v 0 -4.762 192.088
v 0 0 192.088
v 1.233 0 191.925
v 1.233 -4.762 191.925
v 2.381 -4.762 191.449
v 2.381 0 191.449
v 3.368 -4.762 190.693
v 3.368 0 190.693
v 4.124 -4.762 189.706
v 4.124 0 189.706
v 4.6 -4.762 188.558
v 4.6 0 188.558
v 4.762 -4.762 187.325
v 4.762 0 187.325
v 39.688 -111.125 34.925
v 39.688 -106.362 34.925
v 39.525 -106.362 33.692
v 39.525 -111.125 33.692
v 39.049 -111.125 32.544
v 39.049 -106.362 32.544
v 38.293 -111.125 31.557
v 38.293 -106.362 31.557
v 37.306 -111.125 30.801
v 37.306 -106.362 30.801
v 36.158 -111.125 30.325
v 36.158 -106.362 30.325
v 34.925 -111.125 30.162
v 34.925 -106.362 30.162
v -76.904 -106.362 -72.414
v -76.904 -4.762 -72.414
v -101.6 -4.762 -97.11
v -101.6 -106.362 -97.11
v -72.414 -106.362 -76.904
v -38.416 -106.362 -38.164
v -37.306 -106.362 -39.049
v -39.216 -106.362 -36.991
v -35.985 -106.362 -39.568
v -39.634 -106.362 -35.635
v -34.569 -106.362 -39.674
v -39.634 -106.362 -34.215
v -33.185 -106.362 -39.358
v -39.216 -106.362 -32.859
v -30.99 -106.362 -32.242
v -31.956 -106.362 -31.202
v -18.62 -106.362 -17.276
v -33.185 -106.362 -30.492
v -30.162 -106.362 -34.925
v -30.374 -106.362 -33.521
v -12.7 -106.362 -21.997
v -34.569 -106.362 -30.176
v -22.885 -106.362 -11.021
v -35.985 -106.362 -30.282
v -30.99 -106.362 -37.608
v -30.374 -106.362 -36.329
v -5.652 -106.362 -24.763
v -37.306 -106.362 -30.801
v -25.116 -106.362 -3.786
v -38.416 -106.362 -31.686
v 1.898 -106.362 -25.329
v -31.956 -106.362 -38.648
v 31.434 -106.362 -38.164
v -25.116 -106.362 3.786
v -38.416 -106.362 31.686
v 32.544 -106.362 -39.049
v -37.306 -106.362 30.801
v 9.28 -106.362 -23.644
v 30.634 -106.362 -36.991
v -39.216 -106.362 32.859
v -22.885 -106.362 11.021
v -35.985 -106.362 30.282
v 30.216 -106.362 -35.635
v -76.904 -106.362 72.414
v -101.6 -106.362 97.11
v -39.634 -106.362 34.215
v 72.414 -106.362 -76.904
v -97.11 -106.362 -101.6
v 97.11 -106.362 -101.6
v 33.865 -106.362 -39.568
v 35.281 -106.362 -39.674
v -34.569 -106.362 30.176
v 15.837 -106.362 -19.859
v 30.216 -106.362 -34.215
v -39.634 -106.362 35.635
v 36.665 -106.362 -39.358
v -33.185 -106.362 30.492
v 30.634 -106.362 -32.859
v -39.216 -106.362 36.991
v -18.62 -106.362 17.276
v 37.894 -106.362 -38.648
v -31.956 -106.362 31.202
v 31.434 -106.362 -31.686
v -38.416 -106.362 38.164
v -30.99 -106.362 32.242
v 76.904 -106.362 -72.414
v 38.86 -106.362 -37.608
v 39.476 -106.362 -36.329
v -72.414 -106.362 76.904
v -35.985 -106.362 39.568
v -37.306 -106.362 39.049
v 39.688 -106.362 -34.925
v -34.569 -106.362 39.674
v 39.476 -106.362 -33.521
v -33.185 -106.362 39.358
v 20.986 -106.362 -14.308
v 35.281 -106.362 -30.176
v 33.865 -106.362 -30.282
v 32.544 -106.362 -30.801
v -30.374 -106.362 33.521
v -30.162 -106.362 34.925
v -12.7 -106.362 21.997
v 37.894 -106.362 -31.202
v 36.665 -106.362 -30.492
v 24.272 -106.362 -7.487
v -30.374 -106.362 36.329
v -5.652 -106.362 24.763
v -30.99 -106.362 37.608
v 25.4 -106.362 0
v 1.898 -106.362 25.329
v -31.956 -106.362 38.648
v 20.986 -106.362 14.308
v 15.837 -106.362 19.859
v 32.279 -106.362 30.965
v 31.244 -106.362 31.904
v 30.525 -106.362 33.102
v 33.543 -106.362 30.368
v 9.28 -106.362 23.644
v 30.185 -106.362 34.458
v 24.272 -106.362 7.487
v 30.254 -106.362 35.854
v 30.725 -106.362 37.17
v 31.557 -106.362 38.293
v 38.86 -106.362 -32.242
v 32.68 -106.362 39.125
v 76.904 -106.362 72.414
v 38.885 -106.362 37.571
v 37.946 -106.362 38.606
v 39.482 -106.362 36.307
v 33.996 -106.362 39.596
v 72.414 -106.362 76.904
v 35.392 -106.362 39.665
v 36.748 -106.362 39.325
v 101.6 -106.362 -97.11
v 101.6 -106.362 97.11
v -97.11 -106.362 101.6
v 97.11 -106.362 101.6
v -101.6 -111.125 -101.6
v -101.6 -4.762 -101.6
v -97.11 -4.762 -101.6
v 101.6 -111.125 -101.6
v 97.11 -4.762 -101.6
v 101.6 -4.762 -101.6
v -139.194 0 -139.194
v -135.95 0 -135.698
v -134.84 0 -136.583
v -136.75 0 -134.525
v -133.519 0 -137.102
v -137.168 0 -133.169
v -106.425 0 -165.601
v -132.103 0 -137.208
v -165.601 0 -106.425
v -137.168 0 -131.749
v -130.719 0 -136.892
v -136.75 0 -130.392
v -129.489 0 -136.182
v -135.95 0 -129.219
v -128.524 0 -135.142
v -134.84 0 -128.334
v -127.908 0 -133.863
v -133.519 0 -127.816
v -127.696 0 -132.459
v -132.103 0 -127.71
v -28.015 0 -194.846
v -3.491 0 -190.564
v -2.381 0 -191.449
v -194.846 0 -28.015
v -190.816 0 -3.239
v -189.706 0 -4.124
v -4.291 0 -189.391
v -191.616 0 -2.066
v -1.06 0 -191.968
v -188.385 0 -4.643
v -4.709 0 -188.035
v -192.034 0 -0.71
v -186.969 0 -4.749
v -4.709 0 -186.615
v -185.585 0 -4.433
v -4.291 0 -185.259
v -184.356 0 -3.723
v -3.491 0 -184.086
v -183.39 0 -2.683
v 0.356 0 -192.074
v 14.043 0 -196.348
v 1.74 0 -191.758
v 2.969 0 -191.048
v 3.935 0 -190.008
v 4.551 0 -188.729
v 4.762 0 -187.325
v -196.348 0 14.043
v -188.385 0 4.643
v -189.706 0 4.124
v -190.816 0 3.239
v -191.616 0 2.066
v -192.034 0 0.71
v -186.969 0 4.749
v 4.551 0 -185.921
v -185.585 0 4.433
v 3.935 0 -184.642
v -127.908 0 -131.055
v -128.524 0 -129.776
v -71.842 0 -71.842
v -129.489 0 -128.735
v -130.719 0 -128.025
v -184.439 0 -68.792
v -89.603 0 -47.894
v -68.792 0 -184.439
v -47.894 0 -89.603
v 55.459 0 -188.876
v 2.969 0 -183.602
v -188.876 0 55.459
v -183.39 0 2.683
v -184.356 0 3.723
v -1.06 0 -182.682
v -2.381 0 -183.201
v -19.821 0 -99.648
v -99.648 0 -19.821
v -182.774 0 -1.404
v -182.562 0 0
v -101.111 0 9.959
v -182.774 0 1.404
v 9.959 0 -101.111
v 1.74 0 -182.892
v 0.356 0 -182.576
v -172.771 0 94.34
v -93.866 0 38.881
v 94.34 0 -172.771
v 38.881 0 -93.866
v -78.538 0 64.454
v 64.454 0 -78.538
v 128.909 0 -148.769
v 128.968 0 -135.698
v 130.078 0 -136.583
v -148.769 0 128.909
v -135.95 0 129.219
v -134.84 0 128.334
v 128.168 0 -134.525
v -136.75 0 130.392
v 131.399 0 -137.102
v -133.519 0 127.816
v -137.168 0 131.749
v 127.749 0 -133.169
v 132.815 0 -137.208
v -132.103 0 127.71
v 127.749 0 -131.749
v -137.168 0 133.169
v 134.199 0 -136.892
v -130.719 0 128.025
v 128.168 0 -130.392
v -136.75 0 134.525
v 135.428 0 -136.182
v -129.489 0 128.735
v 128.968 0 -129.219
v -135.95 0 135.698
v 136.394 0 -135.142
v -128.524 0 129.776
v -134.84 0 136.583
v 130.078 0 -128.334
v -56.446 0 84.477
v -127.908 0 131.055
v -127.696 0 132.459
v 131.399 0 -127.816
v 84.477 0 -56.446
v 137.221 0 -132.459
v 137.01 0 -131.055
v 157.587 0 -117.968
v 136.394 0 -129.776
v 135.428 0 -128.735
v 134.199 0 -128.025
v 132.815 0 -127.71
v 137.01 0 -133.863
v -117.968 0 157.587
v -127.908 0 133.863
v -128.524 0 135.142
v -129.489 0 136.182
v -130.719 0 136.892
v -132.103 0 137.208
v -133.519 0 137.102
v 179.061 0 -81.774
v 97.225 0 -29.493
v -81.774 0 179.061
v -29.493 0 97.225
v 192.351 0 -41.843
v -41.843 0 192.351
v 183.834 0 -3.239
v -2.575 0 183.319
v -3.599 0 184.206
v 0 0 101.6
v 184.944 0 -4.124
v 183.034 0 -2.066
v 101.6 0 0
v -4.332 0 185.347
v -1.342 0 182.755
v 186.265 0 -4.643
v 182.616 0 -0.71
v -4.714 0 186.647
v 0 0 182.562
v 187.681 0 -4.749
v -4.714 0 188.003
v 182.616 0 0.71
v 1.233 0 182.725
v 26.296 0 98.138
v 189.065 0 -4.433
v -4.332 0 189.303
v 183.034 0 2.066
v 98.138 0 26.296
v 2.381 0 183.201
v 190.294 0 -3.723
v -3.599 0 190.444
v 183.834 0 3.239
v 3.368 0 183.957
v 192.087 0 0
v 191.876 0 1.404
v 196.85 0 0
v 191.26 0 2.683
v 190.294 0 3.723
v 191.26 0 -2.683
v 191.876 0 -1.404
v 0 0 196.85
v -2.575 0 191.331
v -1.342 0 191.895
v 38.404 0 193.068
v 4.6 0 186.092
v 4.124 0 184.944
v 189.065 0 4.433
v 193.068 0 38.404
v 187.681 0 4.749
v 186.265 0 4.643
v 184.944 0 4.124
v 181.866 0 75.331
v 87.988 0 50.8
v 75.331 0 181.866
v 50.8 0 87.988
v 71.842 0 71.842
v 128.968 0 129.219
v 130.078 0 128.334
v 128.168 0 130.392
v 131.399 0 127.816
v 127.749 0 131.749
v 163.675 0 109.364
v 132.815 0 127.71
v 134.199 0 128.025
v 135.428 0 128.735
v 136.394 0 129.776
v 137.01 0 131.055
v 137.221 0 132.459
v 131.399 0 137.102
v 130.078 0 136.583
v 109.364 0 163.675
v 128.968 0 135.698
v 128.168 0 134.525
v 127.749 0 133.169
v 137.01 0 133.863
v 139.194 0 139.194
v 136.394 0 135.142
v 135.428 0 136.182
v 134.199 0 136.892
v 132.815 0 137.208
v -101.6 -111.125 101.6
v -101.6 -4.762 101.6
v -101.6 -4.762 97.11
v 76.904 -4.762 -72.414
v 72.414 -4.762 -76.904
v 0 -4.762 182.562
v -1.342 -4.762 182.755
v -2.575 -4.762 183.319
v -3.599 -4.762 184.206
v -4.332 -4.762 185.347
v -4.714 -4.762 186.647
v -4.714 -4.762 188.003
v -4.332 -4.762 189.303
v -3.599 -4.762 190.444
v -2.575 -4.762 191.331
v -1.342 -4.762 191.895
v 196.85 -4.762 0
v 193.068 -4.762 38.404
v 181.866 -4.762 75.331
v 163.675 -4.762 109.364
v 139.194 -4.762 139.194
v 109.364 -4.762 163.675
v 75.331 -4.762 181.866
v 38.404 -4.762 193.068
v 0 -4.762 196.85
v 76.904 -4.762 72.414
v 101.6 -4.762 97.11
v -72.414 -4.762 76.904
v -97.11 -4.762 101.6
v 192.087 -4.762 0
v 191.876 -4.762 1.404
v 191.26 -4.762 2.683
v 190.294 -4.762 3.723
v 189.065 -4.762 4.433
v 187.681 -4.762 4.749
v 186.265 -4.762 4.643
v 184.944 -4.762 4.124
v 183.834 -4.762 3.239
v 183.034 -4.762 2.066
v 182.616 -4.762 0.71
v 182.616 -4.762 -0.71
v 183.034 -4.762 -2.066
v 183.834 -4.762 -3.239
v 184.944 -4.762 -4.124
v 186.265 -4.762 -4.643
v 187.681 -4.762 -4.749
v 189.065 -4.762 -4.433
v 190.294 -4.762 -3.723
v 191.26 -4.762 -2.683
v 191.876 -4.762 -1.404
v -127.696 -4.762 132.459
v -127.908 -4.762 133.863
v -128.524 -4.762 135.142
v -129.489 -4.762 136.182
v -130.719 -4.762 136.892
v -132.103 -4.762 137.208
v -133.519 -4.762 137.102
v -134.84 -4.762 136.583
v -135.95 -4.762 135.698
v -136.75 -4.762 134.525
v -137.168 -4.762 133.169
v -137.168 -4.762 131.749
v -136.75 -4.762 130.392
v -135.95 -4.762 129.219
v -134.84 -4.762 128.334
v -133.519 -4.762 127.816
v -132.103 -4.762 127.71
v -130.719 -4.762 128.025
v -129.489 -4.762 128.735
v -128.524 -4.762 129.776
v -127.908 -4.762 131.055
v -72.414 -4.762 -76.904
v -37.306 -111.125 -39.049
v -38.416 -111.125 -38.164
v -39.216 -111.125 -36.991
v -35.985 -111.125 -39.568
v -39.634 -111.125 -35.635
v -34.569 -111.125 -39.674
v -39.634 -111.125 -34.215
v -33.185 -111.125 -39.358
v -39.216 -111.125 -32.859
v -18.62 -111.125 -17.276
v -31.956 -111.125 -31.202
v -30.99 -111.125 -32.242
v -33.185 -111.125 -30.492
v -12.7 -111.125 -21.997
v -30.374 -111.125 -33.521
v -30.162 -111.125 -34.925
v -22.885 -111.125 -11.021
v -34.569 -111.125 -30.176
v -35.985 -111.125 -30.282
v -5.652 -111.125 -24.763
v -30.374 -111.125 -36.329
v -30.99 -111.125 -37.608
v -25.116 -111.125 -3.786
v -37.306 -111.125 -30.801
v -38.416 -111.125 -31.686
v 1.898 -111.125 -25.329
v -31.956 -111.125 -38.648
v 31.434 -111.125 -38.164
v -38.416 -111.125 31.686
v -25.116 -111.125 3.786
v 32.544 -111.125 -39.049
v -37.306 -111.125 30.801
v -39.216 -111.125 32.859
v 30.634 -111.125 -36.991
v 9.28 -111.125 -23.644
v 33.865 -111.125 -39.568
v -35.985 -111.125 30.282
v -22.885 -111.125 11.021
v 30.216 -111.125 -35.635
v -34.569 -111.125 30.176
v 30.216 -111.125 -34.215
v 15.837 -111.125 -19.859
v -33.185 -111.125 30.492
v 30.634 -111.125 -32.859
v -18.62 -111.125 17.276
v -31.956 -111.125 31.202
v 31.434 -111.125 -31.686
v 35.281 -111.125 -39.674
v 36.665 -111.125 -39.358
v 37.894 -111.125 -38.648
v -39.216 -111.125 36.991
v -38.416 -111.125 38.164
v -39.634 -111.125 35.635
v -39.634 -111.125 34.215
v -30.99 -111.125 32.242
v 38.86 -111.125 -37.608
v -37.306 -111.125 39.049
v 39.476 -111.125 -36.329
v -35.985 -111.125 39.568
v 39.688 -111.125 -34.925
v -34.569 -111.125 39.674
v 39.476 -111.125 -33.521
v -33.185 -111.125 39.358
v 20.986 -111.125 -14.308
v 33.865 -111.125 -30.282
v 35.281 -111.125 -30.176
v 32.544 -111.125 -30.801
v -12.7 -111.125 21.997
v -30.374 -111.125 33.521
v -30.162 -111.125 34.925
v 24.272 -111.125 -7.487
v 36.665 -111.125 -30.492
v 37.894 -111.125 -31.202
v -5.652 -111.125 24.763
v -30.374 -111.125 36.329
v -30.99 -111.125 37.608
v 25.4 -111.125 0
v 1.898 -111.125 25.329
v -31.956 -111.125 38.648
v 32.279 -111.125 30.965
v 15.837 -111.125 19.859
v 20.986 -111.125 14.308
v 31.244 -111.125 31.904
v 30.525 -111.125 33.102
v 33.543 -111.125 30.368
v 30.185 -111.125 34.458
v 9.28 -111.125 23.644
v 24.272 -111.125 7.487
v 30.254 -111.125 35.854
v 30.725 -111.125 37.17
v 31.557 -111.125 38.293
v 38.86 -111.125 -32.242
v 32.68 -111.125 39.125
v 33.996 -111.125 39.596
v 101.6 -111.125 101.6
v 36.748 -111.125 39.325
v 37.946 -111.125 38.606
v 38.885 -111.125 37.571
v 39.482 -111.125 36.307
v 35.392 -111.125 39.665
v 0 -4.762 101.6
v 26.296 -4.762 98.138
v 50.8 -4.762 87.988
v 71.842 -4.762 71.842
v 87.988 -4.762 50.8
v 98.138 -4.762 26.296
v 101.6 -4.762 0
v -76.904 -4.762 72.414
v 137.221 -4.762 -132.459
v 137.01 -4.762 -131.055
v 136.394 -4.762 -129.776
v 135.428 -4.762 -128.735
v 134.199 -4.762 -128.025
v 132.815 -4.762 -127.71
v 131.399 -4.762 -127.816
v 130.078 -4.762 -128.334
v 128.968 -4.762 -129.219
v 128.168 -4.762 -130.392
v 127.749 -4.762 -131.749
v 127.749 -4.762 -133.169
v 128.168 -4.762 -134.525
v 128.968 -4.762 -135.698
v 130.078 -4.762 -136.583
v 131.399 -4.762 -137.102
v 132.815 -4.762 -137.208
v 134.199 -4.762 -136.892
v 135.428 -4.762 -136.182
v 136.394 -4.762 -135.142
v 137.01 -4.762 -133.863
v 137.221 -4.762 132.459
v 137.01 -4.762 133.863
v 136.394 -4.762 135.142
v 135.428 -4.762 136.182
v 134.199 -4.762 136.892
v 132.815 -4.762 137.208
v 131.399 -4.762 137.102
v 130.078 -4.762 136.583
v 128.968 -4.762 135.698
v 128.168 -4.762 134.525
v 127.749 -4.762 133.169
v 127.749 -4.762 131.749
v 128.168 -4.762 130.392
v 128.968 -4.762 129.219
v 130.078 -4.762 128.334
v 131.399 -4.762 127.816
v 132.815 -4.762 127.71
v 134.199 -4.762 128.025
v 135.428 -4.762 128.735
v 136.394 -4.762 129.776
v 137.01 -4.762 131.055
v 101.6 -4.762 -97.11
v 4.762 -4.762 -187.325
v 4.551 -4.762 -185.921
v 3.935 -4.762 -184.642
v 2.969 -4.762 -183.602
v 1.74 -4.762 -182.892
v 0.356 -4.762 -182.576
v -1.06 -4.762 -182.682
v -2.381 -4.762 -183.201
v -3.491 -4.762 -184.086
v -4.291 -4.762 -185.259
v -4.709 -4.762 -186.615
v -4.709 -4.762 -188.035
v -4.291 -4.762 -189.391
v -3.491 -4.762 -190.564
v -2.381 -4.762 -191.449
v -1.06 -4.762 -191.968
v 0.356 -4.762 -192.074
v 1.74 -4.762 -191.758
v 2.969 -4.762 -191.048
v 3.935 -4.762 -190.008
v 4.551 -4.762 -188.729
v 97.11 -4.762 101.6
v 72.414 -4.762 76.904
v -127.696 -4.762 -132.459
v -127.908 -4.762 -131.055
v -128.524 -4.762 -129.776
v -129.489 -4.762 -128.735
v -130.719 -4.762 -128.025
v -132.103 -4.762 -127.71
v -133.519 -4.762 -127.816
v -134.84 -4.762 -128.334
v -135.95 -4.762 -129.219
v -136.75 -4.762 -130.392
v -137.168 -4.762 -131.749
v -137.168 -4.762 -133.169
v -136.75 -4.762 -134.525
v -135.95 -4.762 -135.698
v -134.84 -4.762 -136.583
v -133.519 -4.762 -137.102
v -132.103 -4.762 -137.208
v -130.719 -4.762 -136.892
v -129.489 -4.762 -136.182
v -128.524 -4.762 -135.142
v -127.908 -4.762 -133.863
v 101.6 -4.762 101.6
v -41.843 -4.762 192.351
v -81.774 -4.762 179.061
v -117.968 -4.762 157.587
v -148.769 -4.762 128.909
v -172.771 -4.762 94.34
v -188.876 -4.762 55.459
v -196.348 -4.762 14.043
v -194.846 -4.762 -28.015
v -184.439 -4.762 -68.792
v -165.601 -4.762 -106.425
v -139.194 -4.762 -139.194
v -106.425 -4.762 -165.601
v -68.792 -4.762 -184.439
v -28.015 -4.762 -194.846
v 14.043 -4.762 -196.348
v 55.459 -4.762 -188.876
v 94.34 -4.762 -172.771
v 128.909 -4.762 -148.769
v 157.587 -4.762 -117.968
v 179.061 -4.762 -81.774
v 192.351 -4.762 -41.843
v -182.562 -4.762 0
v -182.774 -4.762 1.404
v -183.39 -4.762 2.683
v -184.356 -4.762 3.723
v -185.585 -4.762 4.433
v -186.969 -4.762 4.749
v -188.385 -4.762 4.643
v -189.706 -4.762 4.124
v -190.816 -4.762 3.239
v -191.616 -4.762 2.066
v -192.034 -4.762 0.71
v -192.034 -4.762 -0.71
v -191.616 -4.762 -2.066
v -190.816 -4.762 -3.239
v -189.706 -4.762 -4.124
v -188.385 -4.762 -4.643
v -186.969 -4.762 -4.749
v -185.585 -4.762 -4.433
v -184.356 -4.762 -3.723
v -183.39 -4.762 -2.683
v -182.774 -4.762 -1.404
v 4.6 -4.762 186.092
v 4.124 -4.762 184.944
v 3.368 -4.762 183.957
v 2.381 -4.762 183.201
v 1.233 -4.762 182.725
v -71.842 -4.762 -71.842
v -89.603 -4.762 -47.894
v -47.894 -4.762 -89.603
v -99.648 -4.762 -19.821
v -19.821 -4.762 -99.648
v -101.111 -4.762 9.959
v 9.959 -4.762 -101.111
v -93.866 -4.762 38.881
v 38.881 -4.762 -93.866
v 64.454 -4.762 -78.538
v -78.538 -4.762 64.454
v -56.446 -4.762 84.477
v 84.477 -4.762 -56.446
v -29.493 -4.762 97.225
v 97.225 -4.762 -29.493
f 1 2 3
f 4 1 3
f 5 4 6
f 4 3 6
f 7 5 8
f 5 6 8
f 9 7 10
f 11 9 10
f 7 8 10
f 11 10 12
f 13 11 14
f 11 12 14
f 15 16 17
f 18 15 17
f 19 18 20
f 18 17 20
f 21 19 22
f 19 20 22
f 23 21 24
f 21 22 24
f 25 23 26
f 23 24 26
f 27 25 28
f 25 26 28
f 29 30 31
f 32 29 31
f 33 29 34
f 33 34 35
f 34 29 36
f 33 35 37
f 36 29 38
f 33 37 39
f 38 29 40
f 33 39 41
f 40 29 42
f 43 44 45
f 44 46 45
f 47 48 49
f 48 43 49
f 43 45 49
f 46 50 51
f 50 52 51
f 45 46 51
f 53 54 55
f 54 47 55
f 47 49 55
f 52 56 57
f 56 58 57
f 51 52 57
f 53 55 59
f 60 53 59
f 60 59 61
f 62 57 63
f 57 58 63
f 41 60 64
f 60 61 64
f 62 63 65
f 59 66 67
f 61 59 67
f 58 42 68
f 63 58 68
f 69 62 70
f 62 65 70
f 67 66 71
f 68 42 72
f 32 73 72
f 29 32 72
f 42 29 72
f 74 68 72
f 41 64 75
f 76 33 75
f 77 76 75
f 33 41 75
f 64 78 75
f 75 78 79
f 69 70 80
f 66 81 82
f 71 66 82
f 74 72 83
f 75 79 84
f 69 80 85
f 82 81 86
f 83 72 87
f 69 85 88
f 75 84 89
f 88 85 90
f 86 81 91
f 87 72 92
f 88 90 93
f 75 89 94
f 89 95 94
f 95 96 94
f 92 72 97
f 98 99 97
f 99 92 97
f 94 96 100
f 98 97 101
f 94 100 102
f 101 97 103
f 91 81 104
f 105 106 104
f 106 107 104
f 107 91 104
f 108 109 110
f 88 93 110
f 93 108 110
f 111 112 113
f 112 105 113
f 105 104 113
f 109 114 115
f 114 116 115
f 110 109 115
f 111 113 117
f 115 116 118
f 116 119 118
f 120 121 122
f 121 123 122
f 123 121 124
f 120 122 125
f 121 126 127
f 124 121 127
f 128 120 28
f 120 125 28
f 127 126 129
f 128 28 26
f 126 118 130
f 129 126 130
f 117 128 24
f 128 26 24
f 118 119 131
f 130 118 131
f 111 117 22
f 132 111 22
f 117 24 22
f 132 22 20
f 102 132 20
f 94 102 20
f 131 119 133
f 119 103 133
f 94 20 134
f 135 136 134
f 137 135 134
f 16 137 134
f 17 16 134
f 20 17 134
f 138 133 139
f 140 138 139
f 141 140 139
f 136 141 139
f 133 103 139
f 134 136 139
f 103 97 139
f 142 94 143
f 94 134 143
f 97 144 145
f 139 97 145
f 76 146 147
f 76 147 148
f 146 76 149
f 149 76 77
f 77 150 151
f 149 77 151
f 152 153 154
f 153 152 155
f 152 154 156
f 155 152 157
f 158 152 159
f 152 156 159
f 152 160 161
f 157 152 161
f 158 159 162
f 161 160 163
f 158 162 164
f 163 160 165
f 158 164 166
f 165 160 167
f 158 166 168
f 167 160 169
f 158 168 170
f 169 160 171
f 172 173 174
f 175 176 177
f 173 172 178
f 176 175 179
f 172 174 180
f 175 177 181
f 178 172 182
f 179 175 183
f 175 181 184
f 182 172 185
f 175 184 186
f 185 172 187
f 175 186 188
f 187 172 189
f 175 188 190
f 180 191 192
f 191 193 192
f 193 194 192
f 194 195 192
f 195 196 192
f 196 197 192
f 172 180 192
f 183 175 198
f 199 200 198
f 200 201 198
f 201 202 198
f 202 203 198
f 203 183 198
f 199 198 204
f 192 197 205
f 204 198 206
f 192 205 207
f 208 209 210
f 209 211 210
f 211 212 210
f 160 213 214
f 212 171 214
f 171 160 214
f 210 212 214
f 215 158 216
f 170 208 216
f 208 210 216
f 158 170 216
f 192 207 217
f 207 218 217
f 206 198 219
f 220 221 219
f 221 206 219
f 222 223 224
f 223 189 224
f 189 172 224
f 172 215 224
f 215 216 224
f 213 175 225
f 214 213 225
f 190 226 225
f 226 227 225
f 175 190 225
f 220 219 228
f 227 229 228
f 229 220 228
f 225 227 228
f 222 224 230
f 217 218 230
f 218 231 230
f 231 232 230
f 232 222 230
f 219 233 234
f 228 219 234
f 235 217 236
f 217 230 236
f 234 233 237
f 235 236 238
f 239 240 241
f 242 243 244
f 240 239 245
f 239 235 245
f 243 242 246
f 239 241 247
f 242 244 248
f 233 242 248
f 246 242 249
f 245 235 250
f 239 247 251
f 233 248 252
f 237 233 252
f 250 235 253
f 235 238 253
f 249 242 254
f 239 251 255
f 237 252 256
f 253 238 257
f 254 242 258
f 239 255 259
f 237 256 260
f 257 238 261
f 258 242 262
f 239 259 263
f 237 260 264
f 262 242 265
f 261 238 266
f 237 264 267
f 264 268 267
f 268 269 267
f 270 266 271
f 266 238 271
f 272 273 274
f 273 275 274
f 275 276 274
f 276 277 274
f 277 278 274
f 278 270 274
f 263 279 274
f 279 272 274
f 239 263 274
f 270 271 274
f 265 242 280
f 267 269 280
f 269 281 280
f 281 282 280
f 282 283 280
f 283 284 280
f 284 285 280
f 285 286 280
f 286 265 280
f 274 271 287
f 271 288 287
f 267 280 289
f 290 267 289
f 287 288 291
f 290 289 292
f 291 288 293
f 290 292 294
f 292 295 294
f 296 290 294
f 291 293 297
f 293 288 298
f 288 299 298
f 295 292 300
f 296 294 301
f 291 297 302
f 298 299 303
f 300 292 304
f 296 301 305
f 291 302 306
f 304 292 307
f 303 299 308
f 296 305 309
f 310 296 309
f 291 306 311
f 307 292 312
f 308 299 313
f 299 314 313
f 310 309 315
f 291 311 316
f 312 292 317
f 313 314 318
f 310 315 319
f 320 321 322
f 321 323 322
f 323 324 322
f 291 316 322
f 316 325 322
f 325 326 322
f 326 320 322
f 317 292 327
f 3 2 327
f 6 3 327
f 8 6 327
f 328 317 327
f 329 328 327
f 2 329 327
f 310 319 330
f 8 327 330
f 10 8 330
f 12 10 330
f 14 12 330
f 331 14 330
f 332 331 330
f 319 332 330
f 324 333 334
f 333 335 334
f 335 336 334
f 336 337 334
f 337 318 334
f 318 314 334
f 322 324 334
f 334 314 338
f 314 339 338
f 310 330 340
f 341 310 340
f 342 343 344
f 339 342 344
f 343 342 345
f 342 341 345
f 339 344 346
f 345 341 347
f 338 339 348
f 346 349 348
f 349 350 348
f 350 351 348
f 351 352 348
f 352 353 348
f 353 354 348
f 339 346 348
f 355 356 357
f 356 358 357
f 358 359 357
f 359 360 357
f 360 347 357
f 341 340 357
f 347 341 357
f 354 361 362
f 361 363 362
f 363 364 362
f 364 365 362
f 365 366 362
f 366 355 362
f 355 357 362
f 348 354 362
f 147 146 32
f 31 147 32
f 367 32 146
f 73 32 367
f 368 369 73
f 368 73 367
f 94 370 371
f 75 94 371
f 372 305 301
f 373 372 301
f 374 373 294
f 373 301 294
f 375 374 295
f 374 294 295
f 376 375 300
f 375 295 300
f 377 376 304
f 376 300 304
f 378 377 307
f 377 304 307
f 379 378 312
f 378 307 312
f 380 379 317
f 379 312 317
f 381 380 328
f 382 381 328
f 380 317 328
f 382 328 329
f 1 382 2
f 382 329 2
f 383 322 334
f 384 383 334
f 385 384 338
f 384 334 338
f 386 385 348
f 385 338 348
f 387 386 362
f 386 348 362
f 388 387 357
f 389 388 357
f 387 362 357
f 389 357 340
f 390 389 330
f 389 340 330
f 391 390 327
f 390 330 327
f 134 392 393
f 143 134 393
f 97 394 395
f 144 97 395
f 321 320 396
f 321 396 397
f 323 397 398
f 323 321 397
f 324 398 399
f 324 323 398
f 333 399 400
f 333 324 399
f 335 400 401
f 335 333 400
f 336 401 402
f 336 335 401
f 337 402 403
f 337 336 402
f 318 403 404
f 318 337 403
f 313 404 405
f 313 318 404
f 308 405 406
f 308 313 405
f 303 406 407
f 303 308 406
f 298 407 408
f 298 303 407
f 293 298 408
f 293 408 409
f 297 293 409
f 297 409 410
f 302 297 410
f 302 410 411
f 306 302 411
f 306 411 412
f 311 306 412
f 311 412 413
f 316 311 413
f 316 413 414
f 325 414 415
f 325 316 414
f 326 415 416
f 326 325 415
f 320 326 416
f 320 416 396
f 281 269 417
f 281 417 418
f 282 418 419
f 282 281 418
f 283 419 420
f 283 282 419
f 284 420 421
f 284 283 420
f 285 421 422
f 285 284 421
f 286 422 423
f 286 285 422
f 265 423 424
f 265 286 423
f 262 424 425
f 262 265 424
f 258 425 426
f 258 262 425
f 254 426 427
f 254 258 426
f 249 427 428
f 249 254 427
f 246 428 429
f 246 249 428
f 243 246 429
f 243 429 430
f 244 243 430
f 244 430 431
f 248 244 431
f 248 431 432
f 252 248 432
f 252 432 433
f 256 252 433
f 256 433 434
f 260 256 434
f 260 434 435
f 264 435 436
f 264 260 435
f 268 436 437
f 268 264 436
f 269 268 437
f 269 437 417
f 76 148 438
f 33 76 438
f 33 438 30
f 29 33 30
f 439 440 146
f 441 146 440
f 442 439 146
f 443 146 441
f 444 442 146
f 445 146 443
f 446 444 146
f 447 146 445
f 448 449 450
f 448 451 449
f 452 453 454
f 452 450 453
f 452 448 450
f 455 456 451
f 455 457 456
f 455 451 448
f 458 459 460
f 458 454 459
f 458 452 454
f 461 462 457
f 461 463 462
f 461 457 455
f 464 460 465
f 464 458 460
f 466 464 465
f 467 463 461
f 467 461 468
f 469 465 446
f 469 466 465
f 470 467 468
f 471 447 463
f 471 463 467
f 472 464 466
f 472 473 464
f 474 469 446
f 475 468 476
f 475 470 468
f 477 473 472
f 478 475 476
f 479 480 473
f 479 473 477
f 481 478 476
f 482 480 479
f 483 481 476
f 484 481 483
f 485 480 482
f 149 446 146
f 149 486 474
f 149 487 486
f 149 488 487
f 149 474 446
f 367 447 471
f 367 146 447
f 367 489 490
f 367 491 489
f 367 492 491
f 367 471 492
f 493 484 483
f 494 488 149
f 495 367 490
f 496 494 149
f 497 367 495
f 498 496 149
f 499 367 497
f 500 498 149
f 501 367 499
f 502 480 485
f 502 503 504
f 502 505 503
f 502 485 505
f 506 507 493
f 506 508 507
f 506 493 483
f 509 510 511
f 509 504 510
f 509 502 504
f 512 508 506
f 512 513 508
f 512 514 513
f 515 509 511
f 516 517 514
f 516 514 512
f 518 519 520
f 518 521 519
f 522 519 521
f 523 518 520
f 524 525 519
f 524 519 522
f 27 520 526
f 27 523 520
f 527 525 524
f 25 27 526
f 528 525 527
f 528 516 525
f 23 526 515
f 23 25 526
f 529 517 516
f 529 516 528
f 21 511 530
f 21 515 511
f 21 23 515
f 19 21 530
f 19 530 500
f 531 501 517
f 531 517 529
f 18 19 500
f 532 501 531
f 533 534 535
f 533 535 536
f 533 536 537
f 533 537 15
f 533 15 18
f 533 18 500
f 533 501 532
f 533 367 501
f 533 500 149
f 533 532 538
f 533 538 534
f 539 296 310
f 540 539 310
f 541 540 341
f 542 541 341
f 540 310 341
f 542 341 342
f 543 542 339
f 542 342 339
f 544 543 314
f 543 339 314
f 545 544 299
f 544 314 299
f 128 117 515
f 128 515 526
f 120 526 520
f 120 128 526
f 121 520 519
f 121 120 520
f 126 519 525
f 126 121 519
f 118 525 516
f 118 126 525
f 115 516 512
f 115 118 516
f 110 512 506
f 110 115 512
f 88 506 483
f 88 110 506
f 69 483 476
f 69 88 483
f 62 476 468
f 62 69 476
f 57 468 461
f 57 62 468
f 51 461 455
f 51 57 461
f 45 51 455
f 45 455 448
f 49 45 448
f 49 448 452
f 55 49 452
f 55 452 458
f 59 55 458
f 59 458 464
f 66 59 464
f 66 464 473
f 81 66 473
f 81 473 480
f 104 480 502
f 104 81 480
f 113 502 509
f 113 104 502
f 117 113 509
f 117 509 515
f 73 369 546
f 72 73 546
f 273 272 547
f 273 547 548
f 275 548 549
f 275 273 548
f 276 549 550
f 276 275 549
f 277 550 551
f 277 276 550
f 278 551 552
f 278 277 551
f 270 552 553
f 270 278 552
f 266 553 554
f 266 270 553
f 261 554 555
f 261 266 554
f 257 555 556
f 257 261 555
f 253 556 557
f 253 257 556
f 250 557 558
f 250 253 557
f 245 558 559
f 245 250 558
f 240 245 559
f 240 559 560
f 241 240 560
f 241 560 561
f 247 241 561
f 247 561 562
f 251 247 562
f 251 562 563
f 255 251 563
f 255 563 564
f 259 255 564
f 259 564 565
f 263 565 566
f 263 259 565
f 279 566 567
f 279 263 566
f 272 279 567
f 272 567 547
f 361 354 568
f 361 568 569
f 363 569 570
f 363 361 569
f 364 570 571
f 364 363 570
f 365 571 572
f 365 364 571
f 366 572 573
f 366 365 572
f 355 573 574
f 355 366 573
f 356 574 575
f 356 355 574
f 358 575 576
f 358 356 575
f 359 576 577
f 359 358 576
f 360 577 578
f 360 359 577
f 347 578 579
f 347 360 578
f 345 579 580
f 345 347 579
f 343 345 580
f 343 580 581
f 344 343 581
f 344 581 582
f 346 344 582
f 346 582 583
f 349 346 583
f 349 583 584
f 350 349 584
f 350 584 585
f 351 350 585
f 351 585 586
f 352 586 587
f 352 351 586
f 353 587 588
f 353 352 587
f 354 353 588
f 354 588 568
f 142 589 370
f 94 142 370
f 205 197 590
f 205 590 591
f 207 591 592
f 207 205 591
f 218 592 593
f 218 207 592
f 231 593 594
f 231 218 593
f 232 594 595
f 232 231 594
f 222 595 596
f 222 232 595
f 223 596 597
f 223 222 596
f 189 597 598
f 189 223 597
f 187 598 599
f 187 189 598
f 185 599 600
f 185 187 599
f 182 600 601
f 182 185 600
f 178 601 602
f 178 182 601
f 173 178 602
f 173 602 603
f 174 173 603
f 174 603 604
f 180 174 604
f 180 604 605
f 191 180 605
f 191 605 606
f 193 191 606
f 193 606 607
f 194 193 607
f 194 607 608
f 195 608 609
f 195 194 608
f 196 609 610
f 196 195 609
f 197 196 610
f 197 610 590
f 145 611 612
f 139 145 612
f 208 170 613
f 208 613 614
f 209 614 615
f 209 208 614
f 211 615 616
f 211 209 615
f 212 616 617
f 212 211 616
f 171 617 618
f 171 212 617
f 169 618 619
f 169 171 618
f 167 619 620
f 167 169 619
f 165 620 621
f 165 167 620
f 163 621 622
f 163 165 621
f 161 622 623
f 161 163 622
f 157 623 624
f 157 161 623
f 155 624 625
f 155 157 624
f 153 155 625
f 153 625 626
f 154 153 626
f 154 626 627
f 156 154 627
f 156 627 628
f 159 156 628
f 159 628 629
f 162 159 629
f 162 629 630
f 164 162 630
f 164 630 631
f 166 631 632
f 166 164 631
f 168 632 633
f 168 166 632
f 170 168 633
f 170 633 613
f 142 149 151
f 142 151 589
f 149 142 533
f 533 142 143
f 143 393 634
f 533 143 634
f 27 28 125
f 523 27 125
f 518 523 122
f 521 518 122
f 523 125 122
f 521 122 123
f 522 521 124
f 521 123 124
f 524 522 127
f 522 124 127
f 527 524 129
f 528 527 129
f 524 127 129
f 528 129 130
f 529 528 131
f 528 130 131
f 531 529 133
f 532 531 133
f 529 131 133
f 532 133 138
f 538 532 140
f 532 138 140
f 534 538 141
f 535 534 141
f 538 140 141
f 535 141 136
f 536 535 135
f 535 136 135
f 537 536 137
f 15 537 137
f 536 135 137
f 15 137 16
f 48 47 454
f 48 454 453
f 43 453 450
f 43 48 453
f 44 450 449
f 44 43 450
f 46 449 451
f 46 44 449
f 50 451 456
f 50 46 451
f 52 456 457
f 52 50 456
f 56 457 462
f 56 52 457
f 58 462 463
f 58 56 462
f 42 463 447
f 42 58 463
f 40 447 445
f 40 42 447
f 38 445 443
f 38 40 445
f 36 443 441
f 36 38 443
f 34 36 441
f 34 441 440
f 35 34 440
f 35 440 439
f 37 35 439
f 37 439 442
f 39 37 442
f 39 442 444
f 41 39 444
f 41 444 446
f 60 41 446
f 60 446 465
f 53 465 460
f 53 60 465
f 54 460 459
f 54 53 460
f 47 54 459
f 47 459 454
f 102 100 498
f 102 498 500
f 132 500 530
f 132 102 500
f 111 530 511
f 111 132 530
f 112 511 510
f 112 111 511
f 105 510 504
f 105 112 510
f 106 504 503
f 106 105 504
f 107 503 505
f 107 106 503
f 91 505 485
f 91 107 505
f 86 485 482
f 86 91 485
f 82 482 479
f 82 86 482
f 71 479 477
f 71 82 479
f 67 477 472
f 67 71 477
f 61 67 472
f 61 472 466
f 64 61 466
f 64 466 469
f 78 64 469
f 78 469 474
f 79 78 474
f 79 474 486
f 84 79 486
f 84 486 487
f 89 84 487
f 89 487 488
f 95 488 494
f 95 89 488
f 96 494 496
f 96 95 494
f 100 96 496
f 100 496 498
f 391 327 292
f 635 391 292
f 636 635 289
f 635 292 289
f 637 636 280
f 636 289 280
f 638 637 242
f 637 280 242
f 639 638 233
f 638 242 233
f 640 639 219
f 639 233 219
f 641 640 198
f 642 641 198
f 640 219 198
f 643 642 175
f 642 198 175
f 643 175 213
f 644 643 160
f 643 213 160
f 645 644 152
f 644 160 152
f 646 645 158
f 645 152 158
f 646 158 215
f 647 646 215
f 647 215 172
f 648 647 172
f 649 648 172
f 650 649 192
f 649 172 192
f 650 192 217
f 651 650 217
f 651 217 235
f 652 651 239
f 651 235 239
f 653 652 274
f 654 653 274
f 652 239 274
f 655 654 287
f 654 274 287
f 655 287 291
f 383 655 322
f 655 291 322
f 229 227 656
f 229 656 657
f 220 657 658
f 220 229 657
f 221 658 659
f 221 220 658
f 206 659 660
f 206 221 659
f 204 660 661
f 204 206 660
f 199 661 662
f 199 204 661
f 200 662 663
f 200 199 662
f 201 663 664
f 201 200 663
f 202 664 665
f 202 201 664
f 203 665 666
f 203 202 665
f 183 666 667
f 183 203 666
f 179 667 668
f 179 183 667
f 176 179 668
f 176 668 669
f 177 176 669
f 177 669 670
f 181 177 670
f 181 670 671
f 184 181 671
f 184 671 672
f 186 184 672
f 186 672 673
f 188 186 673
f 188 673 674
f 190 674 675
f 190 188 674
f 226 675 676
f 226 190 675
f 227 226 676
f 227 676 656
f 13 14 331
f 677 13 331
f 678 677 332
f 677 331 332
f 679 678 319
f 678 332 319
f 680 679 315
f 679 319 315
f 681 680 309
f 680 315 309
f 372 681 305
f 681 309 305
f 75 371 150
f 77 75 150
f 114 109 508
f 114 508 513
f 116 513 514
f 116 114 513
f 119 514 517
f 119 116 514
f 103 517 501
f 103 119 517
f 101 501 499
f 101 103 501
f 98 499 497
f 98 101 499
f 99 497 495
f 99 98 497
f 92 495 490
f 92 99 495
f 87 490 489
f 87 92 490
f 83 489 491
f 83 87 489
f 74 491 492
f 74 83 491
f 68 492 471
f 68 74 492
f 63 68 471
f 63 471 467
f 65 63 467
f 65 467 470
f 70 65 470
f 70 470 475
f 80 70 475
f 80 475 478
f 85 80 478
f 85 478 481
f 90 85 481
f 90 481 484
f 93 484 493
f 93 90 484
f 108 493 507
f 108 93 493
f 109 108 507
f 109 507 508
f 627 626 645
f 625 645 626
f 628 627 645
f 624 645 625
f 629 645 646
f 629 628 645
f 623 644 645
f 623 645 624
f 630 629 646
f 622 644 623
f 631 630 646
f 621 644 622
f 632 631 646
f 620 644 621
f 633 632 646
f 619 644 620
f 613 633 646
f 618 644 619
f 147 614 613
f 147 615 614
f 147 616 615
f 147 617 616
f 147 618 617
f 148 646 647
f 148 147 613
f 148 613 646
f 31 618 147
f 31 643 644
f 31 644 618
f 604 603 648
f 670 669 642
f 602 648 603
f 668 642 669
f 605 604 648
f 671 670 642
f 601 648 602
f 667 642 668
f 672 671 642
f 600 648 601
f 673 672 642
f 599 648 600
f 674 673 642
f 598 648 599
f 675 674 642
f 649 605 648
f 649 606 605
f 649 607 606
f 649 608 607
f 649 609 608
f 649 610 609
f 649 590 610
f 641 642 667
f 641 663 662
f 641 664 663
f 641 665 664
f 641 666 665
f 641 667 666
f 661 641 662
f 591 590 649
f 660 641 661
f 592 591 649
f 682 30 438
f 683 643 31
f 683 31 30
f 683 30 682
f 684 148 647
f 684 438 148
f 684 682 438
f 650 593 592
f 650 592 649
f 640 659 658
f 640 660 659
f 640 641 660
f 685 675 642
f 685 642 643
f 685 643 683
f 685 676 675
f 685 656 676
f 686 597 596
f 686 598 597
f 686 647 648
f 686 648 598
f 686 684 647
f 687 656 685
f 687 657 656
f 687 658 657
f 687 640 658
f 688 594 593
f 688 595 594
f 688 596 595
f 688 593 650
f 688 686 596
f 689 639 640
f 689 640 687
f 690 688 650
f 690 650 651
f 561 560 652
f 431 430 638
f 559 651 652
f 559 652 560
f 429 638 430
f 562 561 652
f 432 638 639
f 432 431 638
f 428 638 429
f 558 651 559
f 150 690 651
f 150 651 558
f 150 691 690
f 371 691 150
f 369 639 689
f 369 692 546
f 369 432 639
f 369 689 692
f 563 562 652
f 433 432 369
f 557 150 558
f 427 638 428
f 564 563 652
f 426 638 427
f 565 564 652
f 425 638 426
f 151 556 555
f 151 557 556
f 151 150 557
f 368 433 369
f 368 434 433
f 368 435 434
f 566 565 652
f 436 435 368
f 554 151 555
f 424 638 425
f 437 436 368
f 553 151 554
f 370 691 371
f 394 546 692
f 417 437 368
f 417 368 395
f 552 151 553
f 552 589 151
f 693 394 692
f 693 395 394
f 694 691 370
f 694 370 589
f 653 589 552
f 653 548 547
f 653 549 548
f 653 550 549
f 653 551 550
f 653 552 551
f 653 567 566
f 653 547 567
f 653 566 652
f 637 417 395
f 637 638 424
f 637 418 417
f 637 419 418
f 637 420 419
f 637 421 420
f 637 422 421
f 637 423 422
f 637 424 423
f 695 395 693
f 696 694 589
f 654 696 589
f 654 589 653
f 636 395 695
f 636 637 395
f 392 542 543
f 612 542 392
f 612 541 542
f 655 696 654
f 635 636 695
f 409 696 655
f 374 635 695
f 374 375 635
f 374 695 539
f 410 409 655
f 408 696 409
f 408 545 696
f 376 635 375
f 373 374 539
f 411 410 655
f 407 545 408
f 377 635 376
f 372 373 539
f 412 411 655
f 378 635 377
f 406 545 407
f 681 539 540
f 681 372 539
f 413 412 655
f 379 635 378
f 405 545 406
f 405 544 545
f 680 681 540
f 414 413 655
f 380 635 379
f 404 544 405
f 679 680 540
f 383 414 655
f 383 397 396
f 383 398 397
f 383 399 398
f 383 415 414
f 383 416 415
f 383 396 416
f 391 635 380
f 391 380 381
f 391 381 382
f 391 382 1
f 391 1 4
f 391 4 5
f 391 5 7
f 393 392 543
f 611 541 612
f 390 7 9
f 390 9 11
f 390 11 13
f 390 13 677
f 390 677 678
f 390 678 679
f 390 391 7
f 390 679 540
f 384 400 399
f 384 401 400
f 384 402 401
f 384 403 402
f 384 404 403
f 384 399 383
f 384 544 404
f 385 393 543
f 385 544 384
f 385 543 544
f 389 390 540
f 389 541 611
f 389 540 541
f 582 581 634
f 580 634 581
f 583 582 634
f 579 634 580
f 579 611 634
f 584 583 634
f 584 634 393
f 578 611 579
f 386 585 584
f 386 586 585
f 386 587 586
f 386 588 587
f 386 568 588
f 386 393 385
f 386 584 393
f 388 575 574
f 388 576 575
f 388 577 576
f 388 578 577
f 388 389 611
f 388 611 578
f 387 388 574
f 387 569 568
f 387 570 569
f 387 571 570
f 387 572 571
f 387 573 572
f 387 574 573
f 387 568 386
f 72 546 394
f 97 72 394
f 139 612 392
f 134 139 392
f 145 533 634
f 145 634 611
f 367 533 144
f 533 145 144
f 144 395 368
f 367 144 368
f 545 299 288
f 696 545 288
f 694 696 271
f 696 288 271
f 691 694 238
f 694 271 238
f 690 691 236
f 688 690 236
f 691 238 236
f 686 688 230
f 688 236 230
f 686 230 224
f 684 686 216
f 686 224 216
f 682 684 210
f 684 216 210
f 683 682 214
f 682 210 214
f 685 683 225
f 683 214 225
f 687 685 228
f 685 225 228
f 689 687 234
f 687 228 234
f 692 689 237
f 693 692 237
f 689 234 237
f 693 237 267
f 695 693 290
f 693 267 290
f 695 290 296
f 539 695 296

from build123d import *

# Parameters (mm, degrees)
F0_R     = 4.7625
F1_DEPTH = 4.7625
F3_DEPTH = 101.6
F4_W     = 203.2
F4_H     = 203.2
F4_R     = 4.7625
F4_R_2   = 25.4
F5_DEPTH = 4.7625


with BuildPart() as f1:
    # F0 (on Front) → F1 (new body)
    with BuildSketch(Plane.XZ):
        with BuildLine():
            ThreePointArc((196.85, 0), (139.19397, 139.19397), (0, 196.85))
            ThreePointArc((0, 196.85), (-139.19397, -139.19397), (196.85, 0))
        make_face()
        with Locations((-132.458778, -132.458778)):
            Circle(F0_R, mode=Mode.SUBTRACT)
        with Locations((0, -187.325)):
            Circle(F0_R, mode=Mode.SUBTRACT)
        with Locations((132.458778, -132.458778)):
            Circle(F0_R, mode=Mode.SUBTRACT)
        with Locations((-187.325, 0)):
            Circle(F0_R, mode=Mode.SUBTRACT)
        with Locations((-132.458778, 132.458778)):
            Circle(F0_R, mode=Mode.SUBTRACT)
        with BuildLine():
            ThreePointArc((177.8, 0), (-125.723586, -125.723586), (0, 177.8))
            ThreePointArc((0, 177.8), (125.723586, 125.723586), (177.8, 0))
        make_face(mode=Mode.SUBTRACT)
        with Locations((187.325, 0)):
            Circle(F0_R, mode=Mode.SUBTRACT)
        with BuildLine():
            ThreePointArc((4.7625, 187.325), (3.367596, 183.957404), (0, 182.5625))
            ThreePointArc((0, 182.5625), (-4.7625, 187.325), (0, 192.0875))
            ThreePointArc((0, 192.0875), (3.367596, 190.692596), (4.7625, 187.325))
        make_face(mode=Mode.SUBTRACT)
        with Locations((132.458778, 132.458778)):
            Circle(F0_R, mode=Mode.SUBTRACT)
        with BuildLine():
            ThreePointArc((177.8, 0), (125.723586, 125.723586), (0, 177.8))
            ThreePointArc((0, 177.8), (-125.723586, -125.723586), (177.8, 0))
        make_face()
        with BuildLine():
            ThreePointArc((0, 101.6), (71.842049, 71.842049), (101.6, 0))
            ThreePointArc((101.6, 0), (-71.842049, -71.842049), (0, 101.6))
        make_face(mode=Mode.SUBTRACT)
    extrude(amount=F1_DEPTH)

    # F2 (on face) → F3 (join)
    with BuildSketch(Plane.XZ.offset(4.7625)):
        Polygon((-72.414168, 76.904296), (-97.109872, 101.6), (-101.6, 101.6), (-101.6, 97.109872), (-76.904296, 72.414168), (-74.659232, 74.659232), align=None)
        Polygon((76.904296, 72.414168), (101.6, 97.109872), (101.6, 101.6), (97.109872, 101.6), (72.414168, 76.904296), (74.659232, 74.659232), align=None)
        Polygon((101.6, -101.6), (101.6, -97.109872), (76.904296, -72.414168), (74.659232, -74.659232), (72.414168, -76.904296), (97.109872, -101.6), align=None)
        Polygon((-101.6, -101.6), (-97.109872, -101.6), (-72.414168, -76.904296), (-74.659232, -74.659232), (-76.904296, -72.414168), (-101.6, -97.109872), align=None)
    extrude(amount=F3_DEPTH)

    # F4 (on face) → F5 (join)
    with BuildSketch(Plane.XZ.offset(106.3625)):
        Rectangle(F4_W, F4_H)
        with Locations((-34.925, -34.925)):
            Circle(F4_R, mode=Mode.SUBTRACT)
        Circle(F4_R_2, mode=Mode.SUBTRACT)
        with Locations((34.925, -34.925)):
            Circle(F4_R, mode=Mode.SUBTRACT)
        with Locations((-34.925, 34.925)):
            Circle(F4_R, mode=Mode.SUBTRACT)
        with BuildLine():
            ThreePointArc((39.6875, 34.925), (38.292596, 31.557404), (34.925, 30.1625))
            ThreePointArc((34.925, 30.1625), (31.557404, 38.292596), (39.6875, 34.925))
        make_face(mode=Mode.SUBTRACT)
        Polygon((-97.109872, 101.6), (-101.6, 101.6), (-101.6, -101.6), (101.6, -101.6), (101.6, 101.6), align=None)
        with Locations((-34.925, -34.925)):
            Circle(F4_R, mode=Mode.SUBTRACT)
        Circle(F4_R_2, mode=Mode.SUBTRACT)
        with Locations((34.925, -34.925)):
            Circle(F4_R, mode=Mode.SUBTRACT)
        with Locations((-34.925, 34.925)):
            Circle(F4_R, mode=Mode.SUBTRACT)
        with BuildLine():
            ThreePointArc((39.6875, 34.925), (38.292596, 31.557404), (34.925, 30.1625))
            ThreePointArc((34.925, 30.1625), (31.557404, 38.292596), (39.6875, 34.925))
        make_face(mode=Mode.SUBTRACT)
    extrude(amount=F5_DEPTH)


solid = f1.part
